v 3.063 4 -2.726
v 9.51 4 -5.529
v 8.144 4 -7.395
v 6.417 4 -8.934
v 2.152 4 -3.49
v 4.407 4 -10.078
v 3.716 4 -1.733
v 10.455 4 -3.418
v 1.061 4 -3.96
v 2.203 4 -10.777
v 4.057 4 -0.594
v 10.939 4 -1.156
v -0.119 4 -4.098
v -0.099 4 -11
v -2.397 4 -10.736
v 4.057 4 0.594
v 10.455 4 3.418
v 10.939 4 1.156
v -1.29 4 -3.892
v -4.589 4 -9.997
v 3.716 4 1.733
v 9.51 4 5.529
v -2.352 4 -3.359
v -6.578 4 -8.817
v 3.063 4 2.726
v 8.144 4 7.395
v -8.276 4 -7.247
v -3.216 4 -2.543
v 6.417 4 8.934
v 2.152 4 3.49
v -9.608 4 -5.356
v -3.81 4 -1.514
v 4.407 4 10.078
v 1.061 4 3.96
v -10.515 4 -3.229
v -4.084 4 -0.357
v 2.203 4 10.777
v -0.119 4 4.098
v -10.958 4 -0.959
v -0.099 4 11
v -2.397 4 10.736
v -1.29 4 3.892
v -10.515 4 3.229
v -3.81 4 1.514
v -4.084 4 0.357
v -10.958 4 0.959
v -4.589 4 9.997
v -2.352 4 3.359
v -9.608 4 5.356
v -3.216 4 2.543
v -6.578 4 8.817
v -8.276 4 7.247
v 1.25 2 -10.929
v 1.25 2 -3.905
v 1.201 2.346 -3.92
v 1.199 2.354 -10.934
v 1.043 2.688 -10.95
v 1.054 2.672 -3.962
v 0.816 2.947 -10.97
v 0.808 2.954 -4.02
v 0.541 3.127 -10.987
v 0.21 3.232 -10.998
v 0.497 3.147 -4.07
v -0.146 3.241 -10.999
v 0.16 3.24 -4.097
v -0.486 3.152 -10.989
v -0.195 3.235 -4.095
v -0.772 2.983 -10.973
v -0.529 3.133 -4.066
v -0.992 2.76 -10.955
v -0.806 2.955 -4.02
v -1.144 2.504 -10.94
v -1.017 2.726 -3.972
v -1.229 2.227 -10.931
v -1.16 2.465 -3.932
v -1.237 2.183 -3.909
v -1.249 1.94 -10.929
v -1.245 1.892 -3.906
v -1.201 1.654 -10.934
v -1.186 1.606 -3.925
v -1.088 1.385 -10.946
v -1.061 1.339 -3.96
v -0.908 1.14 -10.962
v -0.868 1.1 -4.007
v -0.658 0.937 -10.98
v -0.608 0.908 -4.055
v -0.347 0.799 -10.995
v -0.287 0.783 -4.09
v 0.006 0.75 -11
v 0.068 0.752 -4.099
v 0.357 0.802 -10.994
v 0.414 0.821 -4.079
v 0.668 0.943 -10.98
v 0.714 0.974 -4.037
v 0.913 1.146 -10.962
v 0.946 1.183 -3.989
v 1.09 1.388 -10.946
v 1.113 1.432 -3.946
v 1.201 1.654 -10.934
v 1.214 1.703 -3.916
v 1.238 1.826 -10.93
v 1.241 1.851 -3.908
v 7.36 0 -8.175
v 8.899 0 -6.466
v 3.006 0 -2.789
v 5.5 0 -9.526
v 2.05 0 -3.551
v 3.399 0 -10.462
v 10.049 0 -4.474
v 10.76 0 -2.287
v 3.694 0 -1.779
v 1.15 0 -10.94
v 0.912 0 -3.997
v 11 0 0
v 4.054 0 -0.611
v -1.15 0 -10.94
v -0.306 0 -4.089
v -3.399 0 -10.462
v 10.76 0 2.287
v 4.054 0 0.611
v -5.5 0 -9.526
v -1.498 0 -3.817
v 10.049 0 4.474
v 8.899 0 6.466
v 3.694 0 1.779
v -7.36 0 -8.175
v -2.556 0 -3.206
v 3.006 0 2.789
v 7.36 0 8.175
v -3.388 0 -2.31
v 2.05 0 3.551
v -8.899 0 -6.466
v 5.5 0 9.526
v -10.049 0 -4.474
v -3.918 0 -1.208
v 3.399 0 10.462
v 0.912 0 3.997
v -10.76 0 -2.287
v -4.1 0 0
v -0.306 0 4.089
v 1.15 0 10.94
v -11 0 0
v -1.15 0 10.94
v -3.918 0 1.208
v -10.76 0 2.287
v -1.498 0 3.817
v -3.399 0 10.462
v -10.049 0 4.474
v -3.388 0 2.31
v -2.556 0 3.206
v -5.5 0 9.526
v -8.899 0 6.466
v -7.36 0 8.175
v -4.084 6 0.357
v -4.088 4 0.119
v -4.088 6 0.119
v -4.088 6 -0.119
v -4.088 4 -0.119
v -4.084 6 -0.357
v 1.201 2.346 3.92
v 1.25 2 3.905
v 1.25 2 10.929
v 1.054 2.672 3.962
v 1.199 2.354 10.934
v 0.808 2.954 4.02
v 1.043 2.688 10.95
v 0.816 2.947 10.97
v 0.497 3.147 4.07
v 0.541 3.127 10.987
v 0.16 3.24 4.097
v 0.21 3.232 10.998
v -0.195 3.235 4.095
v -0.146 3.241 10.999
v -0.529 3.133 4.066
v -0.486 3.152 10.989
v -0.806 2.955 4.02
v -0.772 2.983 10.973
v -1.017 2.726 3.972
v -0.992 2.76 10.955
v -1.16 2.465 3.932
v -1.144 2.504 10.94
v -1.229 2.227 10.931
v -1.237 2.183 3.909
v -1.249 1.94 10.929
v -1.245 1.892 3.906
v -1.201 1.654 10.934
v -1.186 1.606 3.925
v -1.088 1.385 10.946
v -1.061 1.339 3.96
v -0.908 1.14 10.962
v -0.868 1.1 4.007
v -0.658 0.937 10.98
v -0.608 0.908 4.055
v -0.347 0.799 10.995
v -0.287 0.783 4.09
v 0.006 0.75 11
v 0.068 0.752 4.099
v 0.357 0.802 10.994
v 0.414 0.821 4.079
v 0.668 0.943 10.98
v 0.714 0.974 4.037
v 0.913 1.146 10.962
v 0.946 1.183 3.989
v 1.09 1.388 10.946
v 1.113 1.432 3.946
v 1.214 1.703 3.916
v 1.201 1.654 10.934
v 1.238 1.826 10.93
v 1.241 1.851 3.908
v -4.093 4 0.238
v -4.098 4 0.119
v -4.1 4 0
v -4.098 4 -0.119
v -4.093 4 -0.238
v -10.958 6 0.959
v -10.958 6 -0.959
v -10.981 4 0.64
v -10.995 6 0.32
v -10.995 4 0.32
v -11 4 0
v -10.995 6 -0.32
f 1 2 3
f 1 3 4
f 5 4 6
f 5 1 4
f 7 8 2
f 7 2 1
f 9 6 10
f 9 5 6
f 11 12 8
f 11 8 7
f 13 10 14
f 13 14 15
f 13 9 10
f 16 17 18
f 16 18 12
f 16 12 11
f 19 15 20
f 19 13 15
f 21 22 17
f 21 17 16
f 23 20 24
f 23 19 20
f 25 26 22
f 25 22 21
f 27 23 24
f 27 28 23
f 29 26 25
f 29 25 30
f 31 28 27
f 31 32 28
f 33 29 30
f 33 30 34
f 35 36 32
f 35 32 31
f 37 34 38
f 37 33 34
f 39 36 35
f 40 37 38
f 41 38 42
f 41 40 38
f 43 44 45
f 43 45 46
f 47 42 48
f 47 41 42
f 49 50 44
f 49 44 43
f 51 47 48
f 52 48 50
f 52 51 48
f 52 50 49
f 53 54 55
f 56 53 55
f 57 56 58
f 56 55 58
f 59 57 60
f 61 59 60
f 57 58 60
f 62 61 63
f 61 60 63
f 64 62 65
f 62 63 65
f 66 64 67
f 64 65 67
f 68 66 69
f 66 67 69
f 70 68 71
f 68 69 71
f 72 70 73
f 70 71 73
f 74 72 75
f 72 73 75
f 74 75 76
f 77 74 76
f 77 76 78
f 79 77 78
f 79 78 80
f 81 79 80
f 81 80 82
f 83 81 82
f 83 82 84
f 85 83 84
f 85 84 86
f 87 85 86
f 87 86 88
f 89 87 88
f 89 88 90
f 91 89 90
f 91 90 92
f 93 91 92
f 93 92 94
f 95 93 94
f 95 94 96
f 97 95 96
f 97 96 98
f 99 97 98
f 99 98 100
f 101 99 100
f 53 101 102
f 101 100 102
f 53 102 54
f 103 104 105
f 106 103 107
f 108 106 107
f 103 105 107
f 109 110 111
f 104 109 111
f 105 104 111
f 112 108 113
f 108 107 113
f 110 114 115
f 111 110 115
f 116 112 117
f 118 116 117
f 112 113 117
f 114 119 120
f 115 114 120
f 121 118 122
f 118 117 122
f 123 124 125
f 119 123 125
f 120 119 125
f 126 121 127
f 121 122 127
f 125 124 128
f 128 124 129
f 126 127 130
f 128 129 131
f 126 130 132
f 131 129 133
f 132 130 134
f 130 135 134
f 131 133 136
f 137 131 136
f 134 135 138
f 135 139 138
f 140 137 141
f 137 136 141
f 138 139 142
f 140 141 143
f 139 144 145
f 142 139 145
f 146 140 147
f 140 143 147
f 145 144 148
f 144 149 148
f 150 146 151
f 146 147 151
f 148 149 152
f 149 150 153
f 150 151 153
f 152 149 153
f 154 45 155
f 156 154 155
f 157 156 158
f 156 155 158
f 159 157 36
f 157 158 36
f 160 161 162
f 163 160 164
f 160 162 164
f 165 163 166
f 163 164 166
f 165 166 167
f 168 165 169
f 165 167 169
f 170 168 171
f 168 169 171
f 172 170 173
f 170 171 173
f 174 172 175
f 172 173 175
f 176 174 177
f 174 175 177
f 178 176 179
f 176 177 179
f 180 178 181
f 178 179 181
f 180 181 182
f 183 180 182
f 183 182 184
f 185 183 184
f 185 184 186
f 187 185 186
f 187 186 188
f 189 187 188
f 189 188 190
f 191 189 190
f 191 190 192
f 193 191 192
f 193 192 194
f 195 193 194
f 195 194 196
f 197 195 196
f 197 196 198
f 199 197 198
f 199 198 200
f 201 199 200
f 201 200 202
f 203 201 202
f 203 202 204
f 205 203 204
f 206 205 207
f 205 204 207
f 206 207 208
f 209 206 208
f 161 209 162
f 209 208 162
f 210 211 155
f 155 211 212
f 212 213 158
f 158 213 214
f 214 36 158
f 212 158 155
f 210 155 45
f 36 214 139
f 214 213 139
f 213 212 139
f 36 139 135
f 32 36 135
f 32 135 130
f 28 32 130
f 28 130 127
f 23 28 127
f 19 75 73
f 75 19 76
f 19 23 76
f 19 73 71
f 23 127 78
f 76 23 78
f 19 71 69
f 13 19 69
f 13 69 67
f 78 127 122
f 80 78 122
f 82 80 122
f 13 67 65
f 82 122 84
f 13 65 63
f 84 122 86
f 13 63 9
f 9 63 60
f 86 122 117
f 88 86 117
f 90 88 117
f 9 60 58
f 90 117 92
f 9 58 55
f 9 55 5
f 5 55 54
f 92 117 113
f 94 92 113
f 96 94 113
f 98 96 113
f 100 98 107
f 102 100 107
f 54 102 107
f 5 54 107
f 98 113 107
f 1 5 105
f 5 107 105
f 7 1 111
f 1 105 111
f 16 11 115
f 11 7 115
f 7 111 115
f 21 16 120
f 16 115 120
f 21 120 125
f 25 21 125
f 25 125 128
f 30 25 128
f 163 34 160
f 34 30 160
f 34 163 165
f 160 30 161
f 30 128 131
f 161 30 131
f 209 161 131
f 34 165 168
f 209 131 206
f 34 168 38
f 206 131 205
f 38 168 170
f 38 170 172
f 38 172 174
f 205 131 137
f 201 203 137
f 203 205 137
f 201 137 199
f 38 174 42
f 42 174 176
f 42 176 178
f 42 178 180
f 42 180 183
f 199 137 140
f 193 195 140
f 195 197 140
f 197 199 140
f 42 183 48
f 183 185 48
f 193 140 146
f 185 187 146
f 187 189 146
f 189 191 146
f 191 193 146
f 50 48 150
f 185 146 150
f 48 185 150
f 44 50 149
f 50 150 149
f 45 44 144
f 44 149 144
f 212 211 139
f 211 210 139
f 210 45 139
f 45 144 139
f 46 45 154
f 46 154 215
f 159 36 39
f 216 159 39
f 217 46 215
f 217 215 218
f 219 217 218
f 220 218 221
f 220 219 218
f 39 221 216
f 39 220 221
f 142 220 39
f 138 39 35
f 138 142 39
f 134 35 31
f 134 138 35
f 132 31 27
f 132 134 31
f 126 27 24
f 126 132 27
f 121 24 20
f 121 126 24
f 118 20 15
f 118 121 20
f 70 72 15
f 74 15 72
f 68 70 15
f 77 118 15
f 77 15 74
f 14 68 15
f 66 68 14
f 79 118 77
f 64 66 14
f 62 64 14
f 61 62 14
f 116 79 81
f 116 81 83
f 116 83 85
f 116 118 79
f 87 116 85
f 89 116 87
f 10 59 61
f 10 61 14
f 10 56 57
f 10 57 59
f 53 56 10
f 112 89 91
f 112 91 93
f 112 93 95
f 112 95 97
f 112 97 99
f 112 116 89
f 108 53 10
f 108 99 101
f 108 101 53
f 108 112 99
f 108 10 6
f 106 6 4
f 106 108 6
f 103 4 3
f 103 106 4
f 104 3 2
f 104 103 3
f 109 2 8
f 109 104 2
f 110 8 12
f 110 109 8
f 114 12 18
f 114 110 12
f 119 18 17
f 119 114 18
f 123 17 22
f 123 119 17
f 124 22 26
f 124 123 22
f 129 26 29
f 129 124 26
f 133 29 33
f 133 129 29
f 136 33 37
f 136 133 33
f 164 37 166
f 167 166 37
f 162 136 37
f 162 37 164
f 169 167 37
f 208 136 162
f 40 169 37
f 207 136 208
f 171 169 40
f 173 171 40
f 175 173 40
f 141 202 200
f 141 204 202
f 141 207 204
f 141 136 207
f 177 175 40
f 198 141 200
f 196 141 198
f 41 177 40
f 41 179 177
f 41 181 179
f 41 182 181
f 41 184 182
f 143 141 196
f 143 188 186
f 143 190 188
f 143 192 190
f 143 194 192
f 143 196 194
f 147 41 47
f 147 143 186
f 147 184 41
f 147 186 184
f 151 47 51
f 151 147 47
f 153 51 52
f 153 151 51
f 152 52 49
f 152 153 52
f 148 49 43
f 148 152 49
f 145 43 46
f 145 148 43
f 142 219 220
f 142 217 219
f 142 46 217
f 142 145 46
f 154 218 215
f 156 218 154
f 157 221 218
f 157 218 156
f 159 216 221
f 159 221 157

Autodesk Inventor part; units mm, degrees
ref_plane "YZ Plane" through (0, 0, 0) normal (1, 0, 0) x (0, 1, 0)
ref_plane "XZ Plane" through (0, 0, 0) normal (0, 1, 0) x (-1, 0, 0)
ref_plane "XY Plane" through (0, 0, 0) normal (0, 0, 1) x (1, 0, 0)
sketch "Sketch1" plane through (0, 0, 0) normal (0, 1, 0) x (-1, 0, 0)
  circle A0 centre (0, 0) radius 4.1
  circle A1 centre (0, 0) radius 11
  dimension "d0" = 8.2
  dimension "d1" = 22
extrude "Extrusion1" add sketch "Sketch1" along normal blind 4
sketch "Sketch2" plane through (0, 4, 0) normal (0, 1, 0) x (1, 0, 0)
  line L0 (0, 0) -> (-8.1688, -0.7147) construction
  line L1 (0, 0) -> (-8.1688, 0.7147) construction
  arc A0 (-4.0844, 0.3573) -> (-4.0844, -0.3573) centre (10.5368, 0) ccw
  line L2 (-4.0844, 0.3573) -> (-10.9581, 0.9587)
  line L3 (-15.4, 0) -> (15.4, 0) construction
  circle A1 centre (0, 0) radius 4.1 construction
  circle A2 centre (0, 0) radius 11 construction
  line L4 (-4.0844, -0.3573) -> (-10.9581, -0.9587)
  circle A3 centre (0, 0) radius 11 projected
  dimension "d4" = 10
extrude "Extrusion2" add sketch "Sketch2" along normal blind 2 contours A0 L4 A3 L2 picked at (-8.693, 0.0397)
sketch "Sketch3" plane through (0, 0, 0) normal (0, 0, 1) x (1, 0, 0)
  circle A0 centre (0, 2) radius 1.25
  line L0 (11, 0) -> (-11, 0) projected
  point P0 (0, 0)
  dimension "d7" = 2.5
  dimension "d8" = 2
extrude "Extrusion3" cut sketch "Sketch3" against normal through all both and the other way through all
properties part number "10d_coupler"
